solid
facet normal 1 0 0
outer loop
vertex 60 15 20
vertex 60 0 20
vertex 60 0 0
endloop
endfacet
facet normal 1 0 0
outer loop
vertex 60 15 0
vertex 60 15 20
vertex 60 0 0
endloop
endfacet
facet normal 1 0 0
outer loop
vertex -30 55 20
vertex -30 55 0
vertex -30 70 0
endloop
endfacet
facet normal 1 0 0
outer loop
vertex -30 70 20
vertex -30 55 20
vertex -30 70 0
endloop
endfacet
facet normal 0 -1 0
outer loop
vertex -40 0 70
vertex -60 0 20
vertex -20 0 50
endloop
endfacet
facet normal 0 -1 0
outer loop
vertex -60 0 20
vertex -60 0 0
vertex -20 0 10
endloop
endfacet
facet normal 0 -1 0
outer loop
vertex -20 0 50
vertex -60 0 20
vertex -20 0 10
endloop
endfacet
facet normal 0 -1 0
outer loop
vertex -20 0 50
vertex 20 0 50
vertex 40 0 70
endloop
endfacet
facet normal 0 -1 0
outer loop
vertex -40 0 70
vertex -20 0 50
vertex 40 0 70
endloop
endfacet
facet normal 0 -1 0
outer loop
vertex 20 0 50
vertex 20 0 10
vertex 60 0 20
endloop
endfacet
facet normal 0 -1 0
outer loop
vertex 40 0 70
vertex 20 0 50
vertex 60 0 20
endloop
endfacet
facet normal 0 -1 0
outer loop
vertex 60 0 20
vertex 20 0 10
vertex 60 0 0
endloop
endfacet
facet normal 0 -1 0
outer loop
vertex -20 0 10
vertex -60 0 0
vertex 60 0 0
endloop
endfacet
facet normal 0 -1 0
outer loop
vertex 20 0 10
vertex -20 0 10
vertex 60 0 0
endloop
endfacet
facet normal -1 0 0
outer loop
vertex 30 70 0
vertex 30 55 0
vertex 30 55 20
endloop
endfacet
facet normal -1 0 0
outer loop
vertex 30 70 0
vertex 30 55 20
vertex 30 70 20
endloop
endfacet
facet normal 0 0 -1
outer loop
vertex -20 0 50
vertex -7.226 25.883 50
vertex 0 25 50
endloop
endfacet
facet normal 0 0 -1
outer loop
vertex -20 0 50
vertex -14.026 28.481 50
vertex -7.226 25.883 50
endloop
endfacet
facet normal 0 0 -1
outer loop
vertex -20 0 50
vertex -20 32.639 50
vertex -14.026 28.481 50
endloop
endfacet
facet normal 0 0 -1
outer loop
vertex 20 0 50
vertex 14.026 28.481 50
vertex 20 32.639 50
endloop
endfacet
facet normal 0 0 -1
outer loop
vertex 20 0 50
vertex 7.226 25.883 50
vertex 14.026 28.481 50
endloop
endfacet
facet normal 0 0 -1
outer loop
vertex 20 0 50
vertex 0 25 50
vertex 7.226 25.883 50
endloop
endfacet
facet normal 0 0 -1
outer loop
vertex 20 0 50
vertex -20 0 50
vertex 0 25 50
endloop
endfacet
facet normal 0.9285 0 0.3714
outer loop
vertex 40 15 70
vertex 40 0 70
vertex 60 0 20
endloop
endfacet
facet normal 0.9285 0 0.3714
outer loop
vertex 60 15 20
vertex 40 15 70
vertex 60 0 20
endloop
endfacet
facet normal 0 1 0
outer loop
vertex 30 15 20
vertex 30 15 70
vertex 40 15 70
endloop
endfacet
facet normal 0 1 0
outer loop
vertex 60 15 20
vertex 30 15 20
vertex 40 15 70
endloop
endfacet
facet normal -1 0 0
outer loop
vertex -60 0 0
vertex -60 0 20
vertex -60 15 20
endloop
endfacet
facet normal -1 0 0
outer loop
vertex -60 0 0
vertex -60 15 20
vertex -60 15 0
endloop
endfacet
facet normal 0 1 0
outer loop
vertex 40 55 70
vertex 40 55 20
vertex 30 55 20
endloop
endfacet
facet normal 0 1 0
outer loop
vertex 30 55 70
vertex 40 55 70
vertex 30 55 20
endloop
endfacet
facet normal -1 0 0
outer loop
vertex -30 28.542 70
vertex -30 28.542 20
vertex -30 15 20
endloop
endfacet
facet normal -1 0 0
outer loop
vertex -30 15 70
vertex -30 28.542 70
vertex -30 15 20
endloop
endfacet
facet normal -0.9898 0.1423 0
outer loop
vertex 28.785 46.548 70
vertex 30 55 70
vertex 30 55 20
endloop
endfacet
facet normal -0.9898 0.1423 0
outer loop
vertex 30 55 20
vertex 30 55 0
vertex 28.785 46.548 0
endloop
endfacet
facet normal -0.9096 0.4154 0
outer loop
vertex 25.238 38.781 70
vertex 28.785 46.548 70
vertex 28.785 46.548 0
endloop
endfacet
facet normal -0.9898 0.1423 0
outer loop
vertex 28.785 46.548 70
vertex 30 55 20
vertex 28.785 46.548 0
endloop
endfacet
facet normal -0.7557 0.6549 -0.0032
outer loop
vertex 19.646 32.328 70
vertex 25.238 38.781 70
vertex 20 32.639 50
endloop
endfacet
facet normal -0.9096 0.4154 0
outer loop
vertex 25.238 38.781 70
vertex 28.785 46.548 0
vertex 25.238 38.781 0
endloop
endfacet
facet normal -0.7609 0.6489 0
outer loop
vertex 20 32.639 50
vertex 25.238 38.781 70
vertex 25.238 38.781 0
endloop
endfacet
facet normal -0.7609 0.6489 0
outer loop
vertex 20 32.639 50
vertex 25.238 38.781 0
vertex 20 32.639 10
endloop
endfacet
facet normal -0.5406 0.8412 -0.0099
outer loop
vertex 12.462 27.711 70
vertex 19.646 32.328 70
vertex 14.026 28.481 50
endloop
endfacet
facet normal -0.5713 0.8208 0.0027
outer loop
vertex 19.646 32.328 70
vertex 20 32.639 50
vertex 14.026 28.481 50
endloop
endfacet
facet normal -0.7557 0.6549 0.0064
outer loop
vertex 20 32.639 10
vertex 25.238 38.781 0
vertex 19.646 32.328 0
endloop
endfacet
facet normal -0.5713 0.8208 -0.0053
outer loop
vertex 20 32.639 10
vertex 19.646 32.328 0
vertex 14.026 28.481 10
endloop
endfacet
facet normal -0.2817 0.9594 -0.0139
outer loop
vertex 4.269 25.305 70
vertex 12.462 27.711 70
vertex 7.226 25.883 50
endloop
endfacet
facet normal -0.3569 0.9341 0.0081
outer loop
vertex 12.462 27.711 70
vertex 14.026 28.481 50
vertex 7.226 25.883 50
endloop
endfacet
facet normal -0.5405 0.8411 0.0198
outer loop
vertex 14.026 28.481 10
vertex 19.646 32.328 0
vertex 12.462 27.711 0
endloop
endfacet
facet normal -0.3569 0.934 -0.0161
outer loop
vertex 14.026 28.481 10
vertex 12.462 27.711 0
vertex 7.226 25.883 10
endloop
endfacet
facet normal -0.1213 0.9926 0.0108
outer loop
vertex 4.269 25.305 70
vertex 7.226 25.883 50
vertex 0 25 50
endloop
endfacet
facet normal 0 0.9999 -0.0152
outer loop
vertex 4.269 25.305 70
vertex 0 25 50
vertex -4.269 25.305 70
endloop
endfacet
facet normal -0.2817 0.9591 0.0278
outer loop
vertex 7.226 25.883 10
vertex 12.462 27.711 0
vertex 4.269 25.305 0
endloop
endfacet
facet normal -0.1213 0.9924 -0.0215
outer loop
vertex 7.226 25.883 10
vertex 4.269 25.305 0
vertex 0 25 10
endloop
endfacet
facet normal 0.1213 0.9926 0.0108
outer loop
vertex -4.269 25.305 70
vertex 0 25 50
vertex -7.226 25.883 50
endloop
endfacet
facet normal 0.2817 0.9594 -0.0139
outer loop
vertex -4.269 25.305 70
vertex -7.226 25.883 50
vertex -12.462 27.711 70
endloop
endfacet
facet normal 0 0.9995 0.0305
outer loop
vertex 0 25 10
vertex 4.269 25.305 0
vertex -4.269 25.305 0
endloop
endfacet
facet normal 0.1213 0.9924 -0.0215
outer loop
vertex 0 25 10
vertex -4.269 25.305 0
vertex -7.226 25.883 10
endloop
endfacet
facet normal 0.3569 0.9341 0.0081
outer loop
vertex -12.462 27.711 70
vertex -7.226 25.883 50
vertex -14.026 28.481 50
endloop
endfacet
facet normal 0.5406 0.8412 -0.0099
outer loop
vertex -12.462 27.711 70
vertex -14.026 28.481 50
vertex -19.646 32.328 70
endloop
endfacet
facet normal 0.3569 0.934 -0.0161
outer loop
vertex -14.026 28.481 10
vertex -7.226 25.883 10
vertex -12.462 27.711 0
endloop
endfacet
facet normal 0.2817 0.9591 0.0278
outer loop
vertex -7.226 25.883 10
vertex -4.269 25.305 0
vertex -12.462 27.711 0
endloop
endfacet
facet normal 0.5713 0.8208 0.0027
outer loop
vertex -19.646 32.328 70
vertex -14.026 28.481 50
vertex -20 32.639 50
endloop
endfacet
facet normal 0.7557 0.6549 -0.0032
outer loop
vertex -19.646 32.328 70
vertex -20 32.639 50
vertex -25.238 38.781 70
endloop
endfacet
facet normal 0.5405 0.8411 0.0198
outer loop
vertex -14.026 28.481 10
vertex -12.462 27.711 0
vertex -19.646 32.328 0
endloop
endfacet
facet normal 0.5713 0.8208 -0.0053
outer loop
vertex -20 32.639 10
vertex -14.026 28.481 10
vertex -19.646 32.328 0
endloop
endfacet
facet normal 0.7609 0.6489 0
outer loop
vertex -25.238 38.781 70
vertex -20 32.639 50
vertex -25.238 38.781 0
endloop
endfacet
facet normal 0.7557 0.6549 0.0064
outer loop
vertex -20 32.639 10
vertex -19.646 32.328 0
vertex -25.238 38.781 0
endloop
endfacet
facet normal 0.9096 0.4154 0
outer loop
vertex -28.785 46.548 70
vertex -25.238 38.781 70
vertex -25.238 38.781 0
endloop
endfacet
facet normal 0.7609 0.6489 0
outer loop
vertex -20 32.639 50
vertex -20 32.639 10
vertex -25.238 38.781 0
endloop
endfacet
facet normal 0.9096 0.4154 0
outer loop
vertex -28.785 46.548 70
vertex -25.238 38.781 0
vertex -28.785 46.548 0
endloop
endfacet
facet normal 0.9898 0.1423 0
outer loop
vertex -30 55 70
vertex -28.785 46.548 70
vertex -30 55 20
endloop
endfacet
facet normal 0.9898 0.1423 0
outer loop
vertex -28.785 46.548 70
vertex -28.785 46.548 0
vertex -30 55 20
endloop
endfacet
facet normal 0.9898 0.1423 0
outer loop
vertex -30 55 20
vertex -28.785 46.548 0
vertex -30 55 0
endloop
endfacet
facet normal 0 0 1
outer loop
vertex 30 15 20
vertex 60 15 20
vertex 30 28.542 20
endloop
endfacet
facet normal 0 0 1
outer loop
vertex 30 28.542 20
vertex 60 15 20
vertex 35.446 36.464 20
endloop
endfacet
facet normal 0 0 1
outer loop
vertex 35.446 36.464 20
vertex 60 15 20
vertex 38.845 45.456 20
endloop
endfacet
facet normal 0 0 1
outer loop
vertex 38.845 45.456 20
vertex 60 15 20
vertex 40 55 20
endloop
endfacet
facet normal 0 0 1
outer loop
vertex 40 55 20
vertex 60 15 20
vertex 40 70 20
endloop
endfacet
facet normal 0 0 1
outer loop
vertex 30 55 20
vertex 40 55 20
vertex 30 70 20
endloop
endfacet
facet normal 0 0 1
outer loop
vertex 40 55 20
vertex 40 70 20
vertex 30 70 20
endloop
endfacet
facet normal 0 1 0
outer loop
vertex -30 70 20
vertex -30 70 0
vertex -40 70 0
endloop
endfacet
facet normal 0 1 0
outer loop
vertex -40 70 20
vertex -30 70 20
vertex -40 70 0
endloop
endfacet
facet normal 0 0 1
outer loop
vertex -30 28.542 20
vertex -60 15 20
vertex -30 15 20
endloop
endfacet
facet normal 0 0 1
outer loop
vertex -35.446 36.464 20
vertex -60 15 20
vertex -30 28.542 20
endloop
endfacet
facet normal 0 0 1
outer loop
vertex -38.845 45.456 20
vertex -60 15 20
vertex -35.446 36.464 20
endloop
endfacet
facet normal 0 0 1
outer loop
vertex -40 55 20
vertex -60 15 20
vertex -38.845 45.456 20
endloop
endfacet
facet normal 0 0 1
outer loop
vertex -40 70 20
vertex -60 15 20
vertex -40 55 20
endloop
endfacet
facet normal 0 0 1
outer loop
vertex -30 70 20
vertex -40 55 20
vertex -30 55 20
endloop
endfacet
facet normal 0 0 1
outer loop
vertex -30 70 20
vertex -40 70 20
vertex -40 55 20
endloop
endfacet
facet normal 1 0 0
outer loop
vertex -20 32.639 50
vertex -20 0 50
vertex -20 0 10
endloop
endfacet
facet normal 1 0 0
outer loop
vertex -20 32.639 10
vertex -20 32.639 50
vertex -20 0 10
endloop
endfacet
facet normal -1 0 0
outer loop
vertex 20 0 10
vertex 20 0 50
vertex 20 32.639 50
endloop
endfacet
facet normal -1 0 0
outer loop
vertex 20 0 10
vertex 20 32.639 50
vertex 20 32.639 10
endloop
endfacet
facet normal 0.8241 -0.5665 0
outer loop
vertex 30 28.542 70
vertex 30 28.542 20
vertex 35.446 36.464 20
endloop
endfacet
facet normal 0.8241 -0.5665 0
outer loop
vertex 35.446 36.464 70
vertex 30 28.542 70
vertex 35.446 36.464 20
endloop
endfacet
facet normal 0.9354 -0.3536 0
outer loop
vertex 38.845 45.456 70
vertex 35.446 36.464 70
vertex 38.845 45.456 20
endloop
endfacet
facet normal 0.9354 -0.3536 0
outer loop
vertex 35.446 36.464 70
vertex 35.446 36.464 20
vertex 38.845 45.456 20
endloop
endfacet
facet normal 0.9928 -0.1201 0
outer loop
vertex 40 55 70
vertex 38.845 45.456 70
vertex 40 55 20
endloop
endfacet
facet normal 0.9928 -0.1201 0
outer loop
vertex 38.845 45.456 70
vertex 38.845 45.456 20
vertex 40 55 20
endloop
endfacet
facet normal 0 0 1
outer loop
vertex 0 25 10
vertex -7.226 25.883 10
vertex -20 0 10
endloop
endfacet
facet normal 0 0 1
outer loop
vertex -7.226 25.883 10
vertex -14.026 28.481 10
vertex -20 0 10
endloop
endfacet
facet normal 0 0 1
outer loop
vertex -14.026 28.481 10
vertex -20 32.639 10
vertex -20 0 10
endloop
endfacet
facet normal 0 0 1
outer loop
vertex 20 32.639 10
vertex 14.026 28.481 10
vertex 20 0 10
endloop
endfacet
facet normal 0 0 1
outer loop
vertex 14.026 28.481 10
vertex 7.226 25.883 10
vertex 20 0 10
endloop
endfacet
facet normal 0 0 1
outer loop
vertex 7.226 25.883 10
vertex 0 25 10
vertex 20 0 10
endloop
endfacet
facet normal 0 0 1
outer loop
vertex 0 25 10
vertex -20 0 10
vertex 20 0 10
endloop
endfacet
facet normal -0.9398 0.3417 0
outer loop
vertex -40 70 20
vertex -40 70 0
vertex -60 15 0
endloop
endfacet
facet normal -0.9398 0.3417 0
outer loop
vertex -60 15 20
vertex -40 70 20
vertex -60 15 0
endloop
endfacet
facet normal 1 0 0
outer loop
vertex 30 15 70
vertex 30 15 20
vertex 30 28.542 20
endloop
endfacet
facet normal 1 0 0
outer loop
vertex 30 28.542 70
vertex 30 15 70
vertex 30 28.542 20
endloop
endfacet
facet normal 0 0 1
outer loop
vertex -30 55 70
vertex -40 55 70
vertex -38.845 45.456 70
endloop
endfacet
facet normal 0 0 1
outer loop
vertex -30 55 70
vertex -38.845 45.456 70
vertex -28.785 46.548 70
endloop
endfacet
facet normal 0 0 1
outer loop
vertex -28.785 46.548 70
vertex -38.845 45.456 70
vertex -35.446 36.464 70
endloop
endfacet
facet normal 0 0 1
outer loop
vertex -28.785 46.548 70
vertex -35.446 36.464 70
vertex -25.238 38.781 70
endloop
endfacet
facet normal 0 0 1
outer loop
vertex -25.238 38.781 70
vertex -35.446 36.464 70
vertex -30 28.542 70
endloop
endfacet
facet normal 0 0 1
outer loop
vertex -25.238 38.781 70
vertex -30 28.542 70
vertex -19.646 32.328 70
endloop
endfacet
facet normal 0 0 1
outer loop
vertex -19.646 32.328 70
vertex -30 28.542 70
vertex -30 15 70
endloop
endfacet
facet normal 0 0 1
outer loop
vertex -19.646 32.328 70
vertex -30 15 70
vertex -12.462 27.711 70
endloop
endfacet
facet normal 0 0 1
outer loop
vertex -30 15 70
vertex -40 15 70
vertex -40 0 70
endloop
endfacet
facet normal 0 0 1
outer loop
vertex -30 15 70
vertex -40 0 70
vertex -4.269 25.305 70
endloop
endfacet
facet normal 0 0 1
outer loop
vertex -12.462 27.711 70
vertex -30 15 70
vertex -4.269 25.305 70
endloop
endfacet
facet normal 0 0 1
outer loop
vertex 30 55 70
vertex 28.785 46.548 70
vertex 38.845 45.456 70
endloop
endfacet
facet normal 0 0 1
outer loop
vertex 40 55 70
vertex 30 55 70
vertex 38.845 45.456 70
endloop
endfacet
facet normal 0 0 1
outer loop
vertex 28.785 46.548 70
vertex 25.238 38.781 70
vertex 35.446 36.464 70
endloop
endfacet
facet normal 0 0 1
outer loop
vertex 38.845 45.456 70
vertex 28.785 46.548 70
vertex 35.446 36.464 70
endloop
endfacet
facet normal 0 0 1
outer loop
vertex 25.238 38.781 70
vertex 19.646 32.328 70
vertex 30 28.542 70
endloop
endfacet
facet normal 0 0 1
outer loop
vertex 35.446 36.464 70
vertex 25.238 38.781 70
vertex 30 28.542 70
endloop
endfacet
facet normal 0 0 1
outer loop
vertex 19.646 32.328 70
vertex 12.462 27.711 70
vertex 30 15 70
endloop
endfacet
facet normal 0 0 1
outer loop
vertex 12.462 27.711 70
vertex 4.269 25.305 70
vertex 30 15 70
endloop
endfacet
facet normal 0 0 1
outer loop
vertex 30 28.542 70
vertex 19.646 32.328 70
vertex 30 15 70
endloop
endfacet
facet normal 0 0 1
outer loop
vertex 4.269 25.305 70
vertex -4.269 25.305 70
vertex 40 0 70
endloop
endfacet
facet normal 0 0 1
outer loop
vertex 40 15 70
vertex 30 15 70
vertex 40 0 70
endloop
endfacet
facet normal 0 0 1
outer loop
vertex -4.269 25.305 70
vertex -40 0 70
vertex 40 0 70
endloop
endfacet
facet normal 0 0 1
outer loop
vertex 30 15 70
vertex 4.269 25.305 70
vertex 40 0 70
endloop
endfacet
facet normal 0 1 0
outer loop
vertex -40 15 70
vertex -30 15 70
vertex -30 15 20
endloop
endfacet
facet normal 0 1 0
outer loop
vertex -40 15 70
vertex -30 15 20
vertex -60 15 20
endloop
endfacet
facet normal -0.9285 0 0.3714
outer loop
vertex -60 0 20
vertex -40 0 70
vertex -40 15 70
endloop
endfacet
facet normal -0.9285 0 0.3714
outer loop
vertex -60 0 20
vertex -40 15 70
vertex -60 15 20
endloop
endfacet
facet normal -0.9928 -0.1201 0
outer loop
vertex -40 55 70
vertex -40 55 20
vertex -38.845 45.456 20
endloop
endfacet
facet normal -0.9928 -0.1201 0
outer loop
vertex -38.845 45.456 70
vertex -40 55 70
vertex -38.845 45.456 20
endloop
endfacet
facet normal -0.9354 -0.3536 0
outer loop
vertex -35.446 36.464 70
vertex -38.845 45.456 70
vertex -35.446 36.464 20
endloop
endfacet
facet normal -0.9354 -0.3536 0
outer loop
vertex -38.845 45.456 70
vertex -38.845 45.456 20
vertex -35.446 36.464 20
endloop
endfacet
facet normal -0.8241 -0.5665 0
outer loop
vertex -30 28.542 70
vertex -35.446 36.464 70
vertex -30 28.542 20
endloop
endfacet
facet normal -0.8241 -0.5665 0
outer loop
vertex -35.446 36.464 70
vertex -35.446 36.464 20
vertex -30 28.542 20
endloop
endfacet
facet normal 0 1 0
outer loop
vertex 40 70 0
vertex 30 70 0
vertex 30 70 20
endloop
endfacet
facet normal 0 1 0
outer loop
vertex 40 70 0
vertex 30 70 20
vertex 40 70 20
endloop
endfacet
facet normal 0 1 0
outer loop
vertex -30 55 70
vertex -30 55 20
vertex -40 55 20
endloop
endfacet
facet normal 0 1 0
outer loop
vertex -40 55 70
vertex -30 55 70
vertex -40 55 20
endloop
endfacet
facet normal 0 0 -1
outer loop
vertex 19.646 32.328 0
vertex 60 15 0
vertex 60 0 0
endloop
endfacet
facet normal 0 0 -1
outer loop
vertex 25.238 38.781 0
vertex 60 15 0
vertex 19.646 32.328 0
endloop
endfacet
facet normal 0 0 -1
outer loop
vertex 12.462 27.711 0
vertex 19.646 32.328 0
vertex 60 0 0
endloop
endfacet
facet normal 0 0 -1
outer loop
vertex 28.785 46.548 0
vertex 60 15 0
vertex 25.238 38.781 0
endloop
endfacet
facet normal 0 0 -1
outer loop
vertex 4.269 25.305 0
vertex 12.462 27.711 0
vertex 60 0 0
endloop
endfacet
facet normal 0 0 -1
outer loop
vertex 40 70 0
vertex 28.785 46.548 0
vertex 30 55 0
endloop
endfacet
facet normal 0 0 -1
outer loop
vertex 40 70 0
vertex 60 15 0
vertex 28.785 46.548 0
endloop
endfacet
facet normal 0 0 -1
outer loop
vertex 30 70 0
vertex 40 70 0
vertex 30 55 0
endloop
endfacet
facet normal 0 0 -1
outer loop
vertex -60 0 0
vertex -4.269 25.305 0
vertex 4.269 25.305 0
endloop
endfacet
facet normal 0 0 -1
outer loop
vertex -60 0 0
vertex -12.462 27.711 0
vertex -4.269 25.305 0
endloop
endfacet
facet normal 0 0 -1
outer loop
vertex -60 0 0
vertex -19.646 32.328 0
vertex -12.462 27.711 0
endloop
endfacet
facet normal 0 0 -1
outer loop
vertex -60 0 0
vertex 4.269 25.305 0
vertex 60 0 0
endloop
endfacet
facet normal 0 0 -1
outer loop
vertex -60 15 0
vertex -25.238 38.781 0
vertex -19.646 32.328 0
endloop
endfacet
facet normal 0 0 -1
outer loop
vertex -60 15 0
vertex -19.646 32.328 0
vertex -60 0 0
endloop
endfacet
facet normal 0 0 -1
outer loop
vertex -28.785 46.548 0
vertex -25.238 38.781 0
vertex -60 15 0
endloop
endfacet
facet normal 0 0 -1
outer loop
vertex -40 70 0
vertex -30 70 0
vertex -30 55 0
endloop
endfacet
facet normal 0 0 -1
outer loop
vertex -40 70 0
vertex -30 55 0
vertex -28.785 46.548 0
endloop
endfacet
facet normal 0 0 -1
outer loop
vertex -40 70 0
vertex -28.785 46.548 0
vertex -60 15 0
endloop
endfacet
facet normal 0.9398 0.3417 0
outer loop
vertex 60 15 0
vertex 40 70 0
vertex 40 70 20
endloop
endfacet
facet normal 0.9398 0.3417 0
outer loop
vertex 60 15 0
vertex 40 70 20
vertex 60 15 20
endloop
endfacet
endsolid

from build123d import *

# Parameters (mm, degrees)
SKETCH1_W           = 80
SKETCH1_H           = 70
BOSS_EXTRUDE1_DEPTH = 15
BOSS_EXTRUDE2_DEPTH = 70
BOSS_EXTRUDE3_DEPTH = 15
BOSS_EXTRUDE4_DEPTH = 20
CUT_EXTRUDE1_DEPTH  = 116.758369028
SKETCH6_W           = 40
SKETCH6_H           = 40
CUT_EXTRUDE2_DEPTH  = 116.758369028


with BuildPart() as part:
    # Sketch1 → Boss-Extrude1 (new body)
    with BuildSketch(Plane(origin=(0, 0, 0), x_dir=(1, 0, 0), z_dir=(0, 1, 0))):
        with Locations((0, -35)):
            Rectangle(SKETCH1_W, SKETCH1_H)
    extrude(amount=BOSS_EXTRUDE1_DEPTH)

    # Sketch2 → Boss-Extrude2 (add)
    with BuildSketch(Plane.XY):
        with BuildLine():
            Line((-30, 10), (30, 10))
            Line((30, 10), (30, 28.542486889))
            ThreePointArc((30, 28.542486889), (37.416573868, 40.857864376), (40, 55))
            Line((40, 55), (-40, 55))
            ThreePointArc((-40, 55), (-37.416573868, 40.857864376), (-30, 28.542486889))
            Line((-30, 28.542486889), (-30, 10))
        make_face()
    extrude(amount=BOSS_EXTRUDE2_DEPTH)

    # Sketch3 → Boss-Extrude3 (add)
    with BuildSketch(Plane(origin=(0, 0, 0), x_dir=(1, 0, 0), z_dir=(0, 1, 0))):
        Polygon((-60, 0), (-38, 0), (-38, -70), (-40, -70), (-60, -20), align=None)
    boss_extrude3 = extrude(amount=BOSS_EXTRUDE3_DEPTH)

    # Sketch4 → Boss-Extrude4 (add)
    with BuildSketch(Plane.XY):
        Polygon((-60, 15), (-30, 15), (-30, 70), (-40, 70), align=None)
    boss_extrude4 = extrude(amount=BOSS_EXTRUDE4_DEPTH)

    # Mirror1: Boss-Extrude3, Boss-Extrude4 across plane
    add(boss_extrude3.mirror(Plane(origin=(0, 0, 0), x_dir=(0, 0, 1), z_dir=(1, 0, 0))))
    add(boss_extrude4.mirror(Plane(origin=(0, 0, 0), x_dir=(0, 0, 1), z_dir=(1, 0, 0))))

    # Sketch5 → Cut-Extrude1 (cut, through all)
    with BuildSketch(Plane.XY):
        with BuildLine():
            Line((-30, 55), (30, 55))
            ThreePointArc((30, 55), (0, 25), (-30, 55))
        make_face()
    extrude(amount=CUT_EXTRUDE1_DEPTH, mode=Mode.SUBTRACT)

    # Sketch6 → Cut-Extrude2 (cut, through all)
    with BuildSketch(Plane(origin=(0, 0, 0), x_dir=(1, 0, 0), z_dir=(0, 1, 0))):
        with Locations((0, -30)):
            Rectangle(SKETCH6_W, SKETCH6_H)
    extrude(amount=CUT_EXTRUDE2_DEPTH, mode=Mode.SUBTRACT)


solid = part.part
